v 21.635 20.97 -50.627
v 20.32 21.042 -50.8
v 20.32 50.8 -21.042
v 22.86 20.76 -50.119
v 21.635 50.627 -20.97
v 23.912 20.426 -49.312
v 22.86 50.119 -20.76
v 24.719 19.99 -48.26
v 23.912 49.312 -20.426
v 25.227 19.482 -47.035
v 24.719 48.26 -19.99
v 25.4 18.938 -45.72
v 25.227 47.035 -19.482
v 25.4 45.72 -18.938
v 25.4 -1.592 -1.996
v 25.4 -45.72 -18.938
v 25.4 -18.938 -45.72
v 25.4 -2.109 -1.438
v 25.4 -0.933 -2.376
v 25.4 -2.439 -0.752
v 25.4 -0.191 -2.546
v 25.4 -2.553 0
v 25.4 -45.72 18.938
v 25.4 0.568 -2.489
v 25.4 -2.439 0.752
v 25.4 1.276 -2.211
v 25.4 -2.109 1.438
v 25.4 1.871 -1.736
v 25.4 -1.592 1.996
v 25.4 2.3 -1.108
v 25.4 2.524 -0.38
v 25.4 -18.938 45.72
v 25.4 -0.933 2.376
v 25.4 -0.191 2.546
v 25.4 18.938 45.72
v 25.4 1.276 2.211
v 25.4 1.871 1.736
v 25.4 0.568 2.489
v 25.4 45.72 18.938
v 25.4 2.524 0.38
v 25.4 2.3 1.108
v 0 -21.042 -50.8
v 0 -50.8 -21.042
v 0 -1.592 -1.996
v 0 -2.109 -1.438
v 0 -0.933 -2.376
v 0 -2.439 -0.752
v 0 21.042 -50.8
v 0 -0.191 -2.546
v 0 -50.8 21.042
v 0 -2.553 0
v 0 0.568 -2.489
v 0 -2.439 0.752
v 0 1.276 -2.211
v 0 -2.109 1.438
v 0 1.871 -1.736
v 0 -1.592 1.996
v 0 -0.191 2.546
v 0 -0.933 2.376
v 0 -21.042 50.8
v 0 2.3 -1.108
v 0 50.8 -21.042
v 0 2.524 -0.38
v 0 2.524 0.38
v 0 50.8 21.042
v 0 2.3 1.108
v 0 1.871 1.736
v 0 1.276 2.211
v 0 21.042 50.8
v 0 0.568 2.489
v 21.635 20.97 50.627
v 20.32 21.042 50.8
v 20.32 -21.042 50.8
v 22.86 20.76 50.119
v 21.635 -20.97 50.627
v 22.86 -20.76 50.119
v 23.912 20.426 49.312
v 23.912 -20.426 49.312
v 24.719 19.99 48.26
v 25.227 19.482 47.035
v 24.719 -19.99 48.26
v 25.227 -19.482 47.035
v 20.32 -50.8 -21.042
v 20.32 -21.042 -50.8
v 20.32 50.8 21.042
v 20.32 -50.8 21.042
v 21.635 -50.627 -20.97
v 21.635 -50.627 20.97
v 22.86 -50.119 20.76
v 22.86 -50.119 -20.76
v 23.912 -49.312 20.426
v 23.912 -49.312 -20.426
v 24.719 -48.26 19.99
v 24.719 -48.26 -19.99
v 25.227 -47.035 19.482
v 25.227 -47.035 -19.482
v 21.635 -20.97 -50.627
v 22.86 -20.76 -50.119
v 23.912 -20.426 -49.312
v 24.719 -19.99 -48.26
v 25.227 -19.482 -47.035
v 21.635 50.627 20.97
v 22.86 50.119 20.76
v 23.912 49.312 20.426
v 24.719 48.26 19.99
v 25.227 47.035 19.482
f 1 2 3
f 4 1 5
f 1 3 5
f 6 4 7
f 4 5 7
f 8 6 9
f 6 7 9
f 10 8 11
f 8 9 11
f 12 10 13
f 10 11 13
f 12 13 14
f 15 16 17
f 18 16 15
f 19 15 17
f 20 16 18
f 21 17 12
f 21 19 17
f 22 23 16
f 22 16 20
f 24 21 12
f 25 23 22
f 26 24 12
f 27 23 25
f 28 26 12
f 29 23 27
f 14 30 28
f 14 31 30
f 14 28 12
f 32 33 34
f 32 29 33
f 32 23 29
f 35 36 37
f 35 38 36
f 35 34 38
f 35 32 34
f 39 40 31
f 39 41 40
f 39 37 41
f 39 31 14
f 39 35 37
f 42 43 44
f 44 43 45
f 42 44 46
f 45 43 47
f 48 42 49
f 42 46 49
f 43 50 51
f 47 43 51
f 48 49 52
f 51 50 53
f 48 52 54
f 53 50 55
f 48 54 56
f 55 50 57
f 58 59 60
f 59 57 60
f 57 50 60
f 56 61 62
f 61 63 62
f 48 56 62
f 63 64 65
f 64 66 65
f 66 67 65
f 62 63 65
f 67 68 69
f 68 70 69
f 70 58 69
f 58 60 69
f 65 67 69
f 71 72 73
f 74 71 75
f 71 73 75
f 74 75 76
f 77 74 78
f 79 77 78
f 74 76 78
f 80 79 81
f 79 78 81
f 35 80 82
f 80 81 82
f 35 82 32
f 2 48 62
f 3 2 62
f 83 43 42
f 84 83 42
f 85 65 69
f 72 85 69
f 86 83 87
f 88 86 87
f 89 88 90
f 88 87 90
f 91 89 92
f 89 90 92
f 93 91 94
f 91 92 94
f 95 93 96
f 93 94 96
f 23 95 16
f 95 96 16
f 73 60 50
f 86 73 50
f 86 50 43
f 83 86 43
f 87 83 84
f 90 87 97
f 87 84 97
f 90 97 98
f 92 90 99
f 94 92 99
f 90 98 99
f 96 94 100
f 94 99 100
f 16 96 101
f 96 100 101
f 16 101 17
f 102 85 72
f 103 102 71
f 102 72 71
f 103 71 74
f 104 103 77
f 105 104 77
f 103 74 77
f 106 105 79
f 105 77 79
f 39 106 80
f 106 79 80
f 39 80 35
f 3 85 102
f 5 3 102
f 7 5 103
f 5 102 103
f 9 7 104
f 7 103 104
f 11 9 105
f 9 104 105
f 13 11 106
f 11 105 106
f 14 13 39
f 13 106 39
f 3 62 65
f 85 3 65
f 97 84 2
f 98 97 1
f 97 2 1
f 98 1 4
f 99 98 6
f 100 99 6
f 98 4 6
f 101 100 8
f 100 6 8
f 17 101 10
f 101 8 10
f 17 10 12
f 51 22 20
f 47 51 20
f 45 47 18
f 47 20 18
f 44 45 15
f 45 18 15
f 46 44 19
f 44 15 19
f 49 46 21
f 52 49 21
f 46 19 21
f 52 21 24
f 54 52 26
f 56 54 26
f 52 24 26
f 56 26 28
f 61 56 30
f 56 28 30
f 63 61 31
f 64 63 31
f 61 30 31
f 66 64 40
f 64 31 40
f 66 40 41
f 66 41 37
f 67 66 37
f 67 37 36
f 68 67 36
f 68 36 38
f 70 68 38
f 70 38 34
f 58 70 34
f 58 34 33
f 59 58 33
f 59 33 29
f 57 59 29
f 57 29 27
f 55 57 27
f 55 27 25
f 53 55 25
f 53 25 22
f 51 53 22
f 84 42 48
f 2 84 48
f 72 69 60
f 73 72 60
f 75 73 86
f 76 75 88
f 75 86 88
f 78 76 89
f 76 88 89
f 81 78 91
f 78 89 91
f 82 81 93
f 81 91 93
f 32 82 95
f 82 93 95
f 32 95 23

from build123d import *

# Parameters (mm, degrees)
F1_DEPTH = 25.4
F2_R     = 5.08
F3_D     = 5.1054


with BuildPart() as f1:
    # F0 (on Right) → F1 (new body)
    with BuildSketch(Plane.YZ):
        Polygon((50.8, -21.0420489686), (50.8, 21.0420489686), (21.0420489686, 50.8), (-21.0420489686, 50.8), (-50.8, 21.0420489686), (-50.8, -21.0420489686), (-21.0420489686, -50.8), (21.0420489686, -50.8), align=None)
    extrude(amount=F1_DEPTH)

    # F2
    f2_edges = [f1.edges().sort_by_distance(p)[0] for p in [
        (25.4, -35.921024, 35.921024),
        (25.4, -50.8, 0),
        (25.4, -35.921024, -35.921024),
        (25.4, 0, -50.8),
        (25.4, 35.921024, -35.921024),
        (25.4, 50.8, 0),
        (25.4, 35.921024, 35.921024),
        (25.4, 0, 50.8),
    ]]
    fillet(f2_edges, radius=F2_R)

    # F3 (through all)
    with Locations(Plane(origin=(0, 0, 0), x_dir=(0, 1, 0), z_dir=(-1, 0, 0))):
        with Locations((0, 0)):
            Hole(F3_D / 2)


solid = f1.part
